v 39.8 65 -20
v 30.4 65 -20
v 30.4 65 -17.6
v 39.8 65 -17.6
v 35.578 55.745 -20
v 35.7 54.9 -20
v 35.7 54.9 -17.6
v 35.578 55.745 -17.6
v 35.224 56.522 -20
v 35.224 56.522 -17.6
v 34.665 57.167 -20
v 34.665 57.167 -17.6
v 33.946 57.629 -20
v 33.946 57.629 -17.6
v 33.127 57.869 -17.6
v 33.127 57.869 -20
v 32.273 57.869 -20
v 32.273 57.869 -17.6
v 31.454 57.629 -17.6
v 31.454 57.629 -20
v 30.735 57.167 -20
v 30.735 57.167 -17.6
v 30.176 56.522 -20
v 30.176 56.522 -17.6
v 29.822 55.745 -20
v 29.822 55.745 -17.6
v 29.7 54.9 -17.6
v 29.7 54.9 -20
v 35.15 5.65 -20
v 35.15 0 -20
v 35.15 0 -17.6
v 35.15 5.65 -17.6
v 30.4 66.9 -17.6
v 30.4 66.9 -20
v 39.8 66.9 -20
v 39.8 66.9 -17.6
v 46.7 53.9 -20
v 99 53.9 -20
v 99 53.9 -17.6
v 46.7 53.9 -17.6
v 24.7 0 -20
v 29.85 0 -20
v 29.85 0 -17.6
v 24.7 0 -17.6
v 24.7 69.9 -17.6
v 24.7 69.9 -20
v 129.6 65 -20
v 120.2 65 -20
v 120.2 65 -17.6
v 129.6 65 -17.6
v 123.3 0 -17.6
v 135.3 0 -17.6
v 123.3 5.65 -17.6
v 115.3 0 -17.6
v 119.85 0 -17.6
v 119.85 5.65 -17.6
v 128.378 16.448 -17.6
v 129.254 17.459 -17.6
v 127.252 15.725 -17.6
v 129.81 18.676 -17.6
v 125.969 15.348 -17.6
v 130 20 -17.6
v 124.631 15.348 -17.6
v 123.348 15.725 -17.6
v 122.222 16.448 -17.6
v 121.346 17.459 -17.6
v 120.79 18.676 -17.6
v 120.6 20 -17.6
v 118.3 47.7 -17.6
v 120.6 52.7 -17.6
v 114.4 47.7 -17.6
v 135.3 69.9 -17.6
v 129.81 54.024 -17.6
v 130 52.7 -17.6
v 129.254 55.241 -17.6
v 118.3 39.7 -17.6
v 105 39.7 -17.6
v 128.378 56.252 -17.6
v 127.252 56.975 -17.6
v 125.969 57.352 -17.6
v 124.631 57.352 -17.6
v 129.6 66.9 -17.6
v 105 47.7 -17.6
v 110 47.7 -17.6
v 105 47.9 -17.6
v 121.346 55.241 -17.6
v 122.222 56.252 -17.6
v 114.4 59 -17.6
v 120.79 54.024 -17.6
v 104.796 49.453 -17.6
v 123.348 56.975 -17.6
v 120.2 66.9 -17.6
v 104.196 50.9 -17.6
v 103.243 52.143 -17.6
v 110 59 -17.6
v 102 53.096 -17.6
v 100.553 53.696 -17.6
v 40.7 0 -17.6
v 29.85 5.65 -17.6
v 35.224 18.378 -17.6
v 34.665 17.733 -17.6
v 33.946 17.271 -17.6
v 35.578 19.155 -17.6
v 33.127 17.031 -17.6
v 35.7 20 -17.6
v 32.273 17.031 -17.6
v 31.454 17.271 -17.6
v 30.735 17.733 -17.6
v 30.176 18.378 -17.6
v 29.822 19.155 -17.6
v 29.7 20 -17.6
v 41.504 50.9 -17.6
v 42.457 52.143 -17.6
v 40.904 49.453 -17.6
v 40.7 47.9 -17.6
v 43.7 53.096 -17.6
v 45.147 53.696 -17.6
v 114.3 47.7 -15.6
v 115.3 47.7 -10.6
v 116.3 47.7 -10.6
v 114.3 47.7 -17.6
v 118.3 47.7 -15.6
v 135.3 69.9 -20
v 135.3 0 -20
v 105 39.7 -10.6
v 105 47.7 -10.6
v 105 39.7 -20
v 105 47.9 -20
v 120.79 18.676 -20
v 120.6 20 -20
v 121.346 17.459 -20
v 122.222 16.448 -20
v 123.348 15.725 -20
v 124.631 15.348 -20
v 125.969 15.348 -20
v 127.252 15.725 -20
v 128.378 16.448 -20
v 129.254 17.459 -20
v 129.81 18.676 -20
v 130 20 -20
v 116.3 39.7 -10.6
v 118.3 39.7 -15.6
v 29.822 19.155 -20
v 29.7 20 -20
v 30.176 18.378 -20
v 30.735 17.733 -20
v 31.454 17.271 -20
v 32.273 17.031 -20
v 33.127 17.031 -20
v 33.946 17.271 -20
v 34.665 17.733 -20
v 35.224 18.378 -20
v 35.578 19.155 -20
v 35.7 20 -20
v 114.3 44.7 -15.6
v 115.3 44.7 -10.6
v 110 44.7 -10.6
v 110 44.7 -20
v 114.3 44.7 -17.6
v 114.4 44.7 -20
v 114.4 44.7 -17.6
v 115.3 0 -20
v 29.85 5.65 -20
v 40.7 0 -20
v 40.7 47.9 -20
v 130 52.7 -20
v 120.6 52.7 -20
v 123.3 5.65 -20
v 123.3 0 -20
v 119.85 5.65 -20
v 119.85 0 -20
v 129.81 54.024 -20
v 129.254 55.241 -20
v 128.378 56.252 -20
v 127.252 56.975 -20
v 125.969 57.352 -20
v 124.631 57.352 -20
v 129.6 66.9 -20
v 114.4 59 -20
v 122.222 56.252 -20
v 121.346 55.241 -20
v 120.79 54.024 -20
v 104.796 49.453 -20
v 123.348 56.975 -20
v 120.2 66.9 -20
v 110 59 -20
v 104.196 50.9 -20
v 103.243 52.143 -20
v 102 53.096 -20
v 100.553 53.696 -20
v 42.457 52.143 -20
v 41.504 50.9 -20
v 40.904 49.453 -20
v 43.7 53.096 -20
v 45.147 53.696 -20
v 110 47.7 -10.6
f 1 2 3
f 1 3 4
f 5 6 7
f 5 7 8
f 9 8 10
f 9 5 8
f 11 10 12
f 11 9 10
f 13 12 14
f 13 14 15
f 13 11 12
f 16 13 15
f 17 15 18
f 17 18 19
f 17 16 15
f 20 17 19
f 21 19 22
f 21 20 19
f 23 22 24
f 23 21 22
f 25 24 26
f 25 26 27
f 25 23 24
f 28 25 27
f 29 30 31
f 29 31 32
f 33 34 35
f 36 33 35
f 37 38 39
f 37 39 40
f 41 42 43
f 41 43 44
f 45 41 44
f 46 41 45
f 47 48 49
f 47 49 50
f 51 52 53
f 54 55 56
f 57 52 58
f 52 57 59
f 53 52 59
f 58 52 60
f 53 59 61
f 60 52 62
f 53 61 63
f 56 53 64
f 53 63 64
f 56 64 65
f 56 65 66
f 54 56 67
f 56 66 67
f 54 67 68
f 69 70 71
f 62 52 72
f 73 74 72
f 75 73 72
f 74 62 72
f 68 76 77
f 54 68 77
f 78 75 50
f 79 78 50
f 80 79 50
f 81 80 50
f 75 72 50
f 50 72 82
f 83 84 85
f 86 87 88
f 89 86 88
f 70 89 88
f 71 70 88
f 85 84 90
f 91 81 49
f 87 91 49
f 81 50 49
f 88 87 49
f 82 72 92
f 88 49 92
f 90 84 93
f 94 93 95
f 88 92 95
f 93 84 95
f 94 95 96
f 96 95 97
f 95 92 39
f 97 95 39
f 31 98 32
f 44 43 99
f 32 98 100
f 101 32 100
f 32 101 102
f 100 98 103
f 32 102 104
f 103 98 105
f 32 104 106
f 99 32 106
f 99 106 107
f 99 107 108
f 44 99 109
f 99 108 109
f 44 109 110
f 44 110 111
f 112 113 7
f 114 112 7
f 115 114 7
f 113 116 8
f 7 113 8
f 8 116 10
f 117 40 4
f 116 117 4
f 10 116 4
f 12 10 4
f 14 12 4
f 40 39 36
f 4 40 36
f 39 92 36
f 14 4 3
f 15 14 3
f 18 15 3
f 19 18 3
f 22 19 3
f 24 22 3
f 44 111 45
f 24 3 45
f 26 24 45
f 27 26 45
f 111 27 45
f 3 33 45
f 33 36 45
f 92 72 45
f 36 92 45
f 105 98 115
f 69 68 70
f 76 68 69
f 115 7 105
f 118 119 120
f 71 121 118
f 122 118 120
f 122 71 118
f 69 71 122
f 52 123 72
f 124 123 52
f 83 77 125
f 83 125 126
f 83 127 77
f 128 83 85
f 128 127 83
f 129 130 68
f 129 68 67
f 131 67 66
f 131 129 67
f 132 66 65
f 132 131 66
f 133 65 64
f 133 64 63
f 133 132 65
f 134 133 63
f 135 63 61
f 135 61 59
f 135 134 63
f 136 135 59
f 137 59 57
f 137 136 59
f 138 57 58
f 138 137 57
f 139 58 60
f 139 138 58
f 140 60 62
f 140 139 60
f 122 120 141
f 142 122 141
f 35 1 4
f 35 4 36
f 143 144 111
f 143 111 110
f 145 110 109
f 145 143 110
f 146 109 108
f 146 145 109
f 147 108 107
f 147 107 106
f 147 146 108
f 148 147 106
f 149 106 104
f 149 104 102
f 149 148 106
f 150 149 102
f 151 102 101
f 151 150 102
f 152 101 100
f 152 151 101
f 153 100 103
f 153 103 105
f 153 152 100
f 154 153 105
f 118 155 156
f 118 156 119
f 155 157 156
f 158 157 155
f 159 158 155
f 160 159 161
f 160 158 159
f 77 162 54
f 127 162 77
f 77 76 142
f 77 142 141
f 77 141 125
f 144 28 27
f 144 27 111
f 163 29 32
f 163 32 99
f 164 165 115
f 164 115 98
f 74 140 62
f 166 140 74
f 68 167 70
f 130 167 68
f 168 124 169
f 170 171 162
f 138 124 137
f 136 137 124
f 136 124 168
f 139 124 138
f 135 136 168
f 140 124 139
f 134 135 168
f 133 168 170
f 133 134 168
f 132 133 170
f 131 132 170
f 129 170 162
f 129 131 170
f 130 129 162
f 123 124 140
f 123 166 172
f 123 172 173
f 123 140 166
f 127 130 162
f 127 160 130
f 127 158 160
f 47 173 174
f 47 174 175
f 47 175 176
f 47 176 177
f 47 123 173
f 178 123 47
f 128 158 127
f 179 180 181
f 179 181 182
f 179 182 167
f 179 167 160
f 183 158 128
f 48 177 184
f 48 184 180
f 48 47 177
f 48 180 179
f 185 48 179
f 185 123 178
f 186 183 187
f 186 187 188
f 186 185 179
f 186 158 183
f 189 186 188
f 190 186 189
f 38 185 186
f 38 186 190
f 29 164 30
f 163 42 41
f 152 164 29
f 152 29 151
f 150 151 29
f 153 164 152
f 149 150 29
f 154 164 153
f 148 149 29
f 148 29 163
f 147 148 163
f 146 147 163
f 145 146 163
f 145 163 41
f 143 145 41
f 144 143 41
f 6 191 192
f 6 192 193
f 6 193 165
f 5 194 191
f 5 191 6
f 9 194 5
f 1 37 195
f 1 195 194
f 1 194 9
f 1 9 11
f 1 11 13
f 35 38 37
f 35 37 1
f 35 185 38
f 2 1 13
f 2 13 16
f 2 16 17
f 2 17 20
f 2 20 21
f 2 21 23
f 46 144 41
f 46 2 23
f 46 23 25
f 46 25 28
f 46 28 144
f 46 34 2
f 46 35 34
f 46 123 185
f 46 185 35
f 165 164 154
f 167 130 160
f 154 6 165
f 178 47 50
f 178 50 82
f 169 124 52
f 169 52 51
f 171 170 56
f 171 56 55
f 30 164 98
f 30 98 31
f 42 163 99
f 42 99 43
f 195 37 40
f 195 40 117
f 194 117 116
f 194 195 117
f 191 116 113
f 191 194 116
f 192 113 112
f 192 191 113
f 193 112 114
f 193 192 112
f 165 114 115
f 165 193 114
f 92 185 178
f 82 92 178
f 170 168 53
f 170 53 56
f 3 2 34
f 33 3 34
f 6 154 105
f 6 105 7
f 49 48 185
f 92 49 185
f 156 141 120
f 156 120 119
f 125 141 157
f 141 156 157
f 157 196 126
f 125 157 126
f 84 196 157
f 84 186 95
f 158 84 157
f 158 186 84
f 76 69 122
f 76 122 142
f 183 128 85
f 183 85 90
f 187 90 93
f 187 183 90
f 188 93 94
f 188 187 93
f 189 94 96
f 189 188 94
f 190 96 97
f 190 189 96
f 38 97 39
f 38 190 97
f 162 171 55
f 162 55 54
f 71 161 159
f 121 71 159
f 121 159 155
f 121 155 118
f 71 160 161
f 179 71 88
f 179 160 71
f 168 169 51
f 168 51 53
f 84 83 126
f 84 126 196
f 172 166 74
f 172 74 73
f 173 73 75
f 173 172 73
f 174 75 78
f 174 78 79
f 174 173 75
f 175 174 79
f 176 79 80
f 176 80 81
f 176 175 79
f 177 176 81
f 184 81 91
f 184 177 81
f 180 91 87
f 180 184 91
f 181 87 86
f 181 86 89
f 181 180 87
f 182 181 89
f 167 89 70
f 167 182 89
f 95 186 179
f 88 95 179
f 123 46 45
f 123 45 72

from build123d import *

# Parameters (mm, degrees)
EXTRUDE001_DEPTH = 7
SKETCH011_W      = 9.4
SKETCH011_H      = 1.9
SKETCH011_W_2    = 4.4
SKETCH011_H_2    = 14.3
PAD008_DEPTH     = 2.4
CHAMFER004_SIZE2 = 2
CHAMFER004_SIZE  = 5
CHAMFER005_SIZE2 = 5
CHAMFER005_SIZE  = 1


with BuildPart() as extrude001:
    # Sketch012 (on CopyDatumPlane) → Extrude001 (new body)
    with BuildSketch(Plane.XY.offset(2.4)):
        Polygon((25, 47.7), (30, 47.7), (30, 44.7), (34.3, 44.7), (34.3, 47.7), (38.3, 47.7), (38.3, 39.7), (25, 39.7), align=None)
    extrude(amount=EXTRUDE001_DEPTH)


with BuildPart() as body005:
    # Sketch011 → Pad008 (new body)
    with BuildSketch(Plane.XY):
        with BuildLine():
            Line((-55.3, 0), (-55.3, 69.9))
            Line((-55.3, 69.9), (55.3, 69.9))
            Line((55.3, 69.9), (55.3, 0))
            Line((55.3, 0), (43.3, 0))
            Line((43.3, 0), (43.3, 5.65))
            Line((43.3, 5.65), (39.85, 5.65))
            Line((39.85, 5.65), (39.85, 0))
            Line((39.85, 0), (35.3, 0))
            Line((35.3, 0), (25, 39.7))
            Line((25, 39.7), (25, 47.9))
            ThreePointArc((25, 47.9), (23.242641, 52.142641), (19, 53.9))
            Line((19, 53.9), (-33.3, 53.9))
            ThreePointArc((-33.3, 53.9), (-37.542641, 52.142641), (-39.3, 47.9))
            Line((-39.3, 47.9), (-39.3, 0))
            Line((-39.3, 0), (-44.85, 0))
            Line((-44.85, 0), (-44.85, 5.65))
            Line((-44.85, 5.65), (-50.15, 5.65))
            Line((-50.15, 5.65), (-50.15, 0))
            Line((-50.15, 0), (-55.3, 0))
        make_face()
        with Locations((-44.9, 65.95)):
            Rectangle(SKETCH011_W, SKETCH011_H, mode=Mode.SUBTRACT)
        with Locations((44.9, 65.95)):
            Rectangle(SKETCH011_W, SKETCH011_H, mode=Mode.SUBTRACT)
        with BuildLine():
            Line((-50.3, 54.9), (-50.3, 20))
            ThreePointArc((-50.3, 20), (-47.3, 17), (-44.3, 20))
            Line((-44.3, 20), (-44.3, 54.9))
            ThreePointArc((-44.3, 54.9), (-47.3, 57.9), (-50.3, 54.9))
        make_face(mode=Mode.SUBTRACT)
        with BuildLine():
            Line((40.6, 52.7), (40.6, 20))
            ThreePointArc((40.6, 20), (45.3, 15.3), (50, 20))
            Line((50, 20), (50, 52.7))
            ThreePointArc((50, 52.7), (45.3, 57.4), (40.6, 52.7))
        make_face(mode=Mode.SUBTRACT)
        with Locations((32.2, 51.85)):
            Rectangle(SKETCH011_W_2, SKETCH011_H_2, mode=Mode.SUBTRACT)
    extrude(amount=PAD008_DEPTH)

    # Fusion: union Extrude001
    add(extrude001.part)

    # Chamfer004
    chamfer004_edges = [body005.edges().sort_by_distance(p)[0] for p in [
        (38.3, 43.7, 9.4),
    ]]
    chamfer004_side = body005.faces().sort_by_distance((38.3, 43.7, 5.9))[0]
    chamfer(chamfer004_edges, length=CHAMFER004_SIZE, length2=CHAMFER004_SIZE2, reference=chamfer004_side)

    # Chamfer005
    chamfer005_edges = [body005.edges().sort_by_distance(p)[0] for p in [
        (34.3, 46.2, 9.4),
    ]]
    chamfer005_side = body005.faces().sort_by_distance((30.400323, 43.283871, 9.4))[0]
    chamfer(chamfer005_edges, length=CHAMFER005_SIZE, length2=CHAMFER005_SIZE2, reference=chamfer005_side)


with BuildPart() as body005_1:
    # Body005 placement: moved
    add(body005.part.moved(Location((80, 0, -20))))


solid = body005_1.part
